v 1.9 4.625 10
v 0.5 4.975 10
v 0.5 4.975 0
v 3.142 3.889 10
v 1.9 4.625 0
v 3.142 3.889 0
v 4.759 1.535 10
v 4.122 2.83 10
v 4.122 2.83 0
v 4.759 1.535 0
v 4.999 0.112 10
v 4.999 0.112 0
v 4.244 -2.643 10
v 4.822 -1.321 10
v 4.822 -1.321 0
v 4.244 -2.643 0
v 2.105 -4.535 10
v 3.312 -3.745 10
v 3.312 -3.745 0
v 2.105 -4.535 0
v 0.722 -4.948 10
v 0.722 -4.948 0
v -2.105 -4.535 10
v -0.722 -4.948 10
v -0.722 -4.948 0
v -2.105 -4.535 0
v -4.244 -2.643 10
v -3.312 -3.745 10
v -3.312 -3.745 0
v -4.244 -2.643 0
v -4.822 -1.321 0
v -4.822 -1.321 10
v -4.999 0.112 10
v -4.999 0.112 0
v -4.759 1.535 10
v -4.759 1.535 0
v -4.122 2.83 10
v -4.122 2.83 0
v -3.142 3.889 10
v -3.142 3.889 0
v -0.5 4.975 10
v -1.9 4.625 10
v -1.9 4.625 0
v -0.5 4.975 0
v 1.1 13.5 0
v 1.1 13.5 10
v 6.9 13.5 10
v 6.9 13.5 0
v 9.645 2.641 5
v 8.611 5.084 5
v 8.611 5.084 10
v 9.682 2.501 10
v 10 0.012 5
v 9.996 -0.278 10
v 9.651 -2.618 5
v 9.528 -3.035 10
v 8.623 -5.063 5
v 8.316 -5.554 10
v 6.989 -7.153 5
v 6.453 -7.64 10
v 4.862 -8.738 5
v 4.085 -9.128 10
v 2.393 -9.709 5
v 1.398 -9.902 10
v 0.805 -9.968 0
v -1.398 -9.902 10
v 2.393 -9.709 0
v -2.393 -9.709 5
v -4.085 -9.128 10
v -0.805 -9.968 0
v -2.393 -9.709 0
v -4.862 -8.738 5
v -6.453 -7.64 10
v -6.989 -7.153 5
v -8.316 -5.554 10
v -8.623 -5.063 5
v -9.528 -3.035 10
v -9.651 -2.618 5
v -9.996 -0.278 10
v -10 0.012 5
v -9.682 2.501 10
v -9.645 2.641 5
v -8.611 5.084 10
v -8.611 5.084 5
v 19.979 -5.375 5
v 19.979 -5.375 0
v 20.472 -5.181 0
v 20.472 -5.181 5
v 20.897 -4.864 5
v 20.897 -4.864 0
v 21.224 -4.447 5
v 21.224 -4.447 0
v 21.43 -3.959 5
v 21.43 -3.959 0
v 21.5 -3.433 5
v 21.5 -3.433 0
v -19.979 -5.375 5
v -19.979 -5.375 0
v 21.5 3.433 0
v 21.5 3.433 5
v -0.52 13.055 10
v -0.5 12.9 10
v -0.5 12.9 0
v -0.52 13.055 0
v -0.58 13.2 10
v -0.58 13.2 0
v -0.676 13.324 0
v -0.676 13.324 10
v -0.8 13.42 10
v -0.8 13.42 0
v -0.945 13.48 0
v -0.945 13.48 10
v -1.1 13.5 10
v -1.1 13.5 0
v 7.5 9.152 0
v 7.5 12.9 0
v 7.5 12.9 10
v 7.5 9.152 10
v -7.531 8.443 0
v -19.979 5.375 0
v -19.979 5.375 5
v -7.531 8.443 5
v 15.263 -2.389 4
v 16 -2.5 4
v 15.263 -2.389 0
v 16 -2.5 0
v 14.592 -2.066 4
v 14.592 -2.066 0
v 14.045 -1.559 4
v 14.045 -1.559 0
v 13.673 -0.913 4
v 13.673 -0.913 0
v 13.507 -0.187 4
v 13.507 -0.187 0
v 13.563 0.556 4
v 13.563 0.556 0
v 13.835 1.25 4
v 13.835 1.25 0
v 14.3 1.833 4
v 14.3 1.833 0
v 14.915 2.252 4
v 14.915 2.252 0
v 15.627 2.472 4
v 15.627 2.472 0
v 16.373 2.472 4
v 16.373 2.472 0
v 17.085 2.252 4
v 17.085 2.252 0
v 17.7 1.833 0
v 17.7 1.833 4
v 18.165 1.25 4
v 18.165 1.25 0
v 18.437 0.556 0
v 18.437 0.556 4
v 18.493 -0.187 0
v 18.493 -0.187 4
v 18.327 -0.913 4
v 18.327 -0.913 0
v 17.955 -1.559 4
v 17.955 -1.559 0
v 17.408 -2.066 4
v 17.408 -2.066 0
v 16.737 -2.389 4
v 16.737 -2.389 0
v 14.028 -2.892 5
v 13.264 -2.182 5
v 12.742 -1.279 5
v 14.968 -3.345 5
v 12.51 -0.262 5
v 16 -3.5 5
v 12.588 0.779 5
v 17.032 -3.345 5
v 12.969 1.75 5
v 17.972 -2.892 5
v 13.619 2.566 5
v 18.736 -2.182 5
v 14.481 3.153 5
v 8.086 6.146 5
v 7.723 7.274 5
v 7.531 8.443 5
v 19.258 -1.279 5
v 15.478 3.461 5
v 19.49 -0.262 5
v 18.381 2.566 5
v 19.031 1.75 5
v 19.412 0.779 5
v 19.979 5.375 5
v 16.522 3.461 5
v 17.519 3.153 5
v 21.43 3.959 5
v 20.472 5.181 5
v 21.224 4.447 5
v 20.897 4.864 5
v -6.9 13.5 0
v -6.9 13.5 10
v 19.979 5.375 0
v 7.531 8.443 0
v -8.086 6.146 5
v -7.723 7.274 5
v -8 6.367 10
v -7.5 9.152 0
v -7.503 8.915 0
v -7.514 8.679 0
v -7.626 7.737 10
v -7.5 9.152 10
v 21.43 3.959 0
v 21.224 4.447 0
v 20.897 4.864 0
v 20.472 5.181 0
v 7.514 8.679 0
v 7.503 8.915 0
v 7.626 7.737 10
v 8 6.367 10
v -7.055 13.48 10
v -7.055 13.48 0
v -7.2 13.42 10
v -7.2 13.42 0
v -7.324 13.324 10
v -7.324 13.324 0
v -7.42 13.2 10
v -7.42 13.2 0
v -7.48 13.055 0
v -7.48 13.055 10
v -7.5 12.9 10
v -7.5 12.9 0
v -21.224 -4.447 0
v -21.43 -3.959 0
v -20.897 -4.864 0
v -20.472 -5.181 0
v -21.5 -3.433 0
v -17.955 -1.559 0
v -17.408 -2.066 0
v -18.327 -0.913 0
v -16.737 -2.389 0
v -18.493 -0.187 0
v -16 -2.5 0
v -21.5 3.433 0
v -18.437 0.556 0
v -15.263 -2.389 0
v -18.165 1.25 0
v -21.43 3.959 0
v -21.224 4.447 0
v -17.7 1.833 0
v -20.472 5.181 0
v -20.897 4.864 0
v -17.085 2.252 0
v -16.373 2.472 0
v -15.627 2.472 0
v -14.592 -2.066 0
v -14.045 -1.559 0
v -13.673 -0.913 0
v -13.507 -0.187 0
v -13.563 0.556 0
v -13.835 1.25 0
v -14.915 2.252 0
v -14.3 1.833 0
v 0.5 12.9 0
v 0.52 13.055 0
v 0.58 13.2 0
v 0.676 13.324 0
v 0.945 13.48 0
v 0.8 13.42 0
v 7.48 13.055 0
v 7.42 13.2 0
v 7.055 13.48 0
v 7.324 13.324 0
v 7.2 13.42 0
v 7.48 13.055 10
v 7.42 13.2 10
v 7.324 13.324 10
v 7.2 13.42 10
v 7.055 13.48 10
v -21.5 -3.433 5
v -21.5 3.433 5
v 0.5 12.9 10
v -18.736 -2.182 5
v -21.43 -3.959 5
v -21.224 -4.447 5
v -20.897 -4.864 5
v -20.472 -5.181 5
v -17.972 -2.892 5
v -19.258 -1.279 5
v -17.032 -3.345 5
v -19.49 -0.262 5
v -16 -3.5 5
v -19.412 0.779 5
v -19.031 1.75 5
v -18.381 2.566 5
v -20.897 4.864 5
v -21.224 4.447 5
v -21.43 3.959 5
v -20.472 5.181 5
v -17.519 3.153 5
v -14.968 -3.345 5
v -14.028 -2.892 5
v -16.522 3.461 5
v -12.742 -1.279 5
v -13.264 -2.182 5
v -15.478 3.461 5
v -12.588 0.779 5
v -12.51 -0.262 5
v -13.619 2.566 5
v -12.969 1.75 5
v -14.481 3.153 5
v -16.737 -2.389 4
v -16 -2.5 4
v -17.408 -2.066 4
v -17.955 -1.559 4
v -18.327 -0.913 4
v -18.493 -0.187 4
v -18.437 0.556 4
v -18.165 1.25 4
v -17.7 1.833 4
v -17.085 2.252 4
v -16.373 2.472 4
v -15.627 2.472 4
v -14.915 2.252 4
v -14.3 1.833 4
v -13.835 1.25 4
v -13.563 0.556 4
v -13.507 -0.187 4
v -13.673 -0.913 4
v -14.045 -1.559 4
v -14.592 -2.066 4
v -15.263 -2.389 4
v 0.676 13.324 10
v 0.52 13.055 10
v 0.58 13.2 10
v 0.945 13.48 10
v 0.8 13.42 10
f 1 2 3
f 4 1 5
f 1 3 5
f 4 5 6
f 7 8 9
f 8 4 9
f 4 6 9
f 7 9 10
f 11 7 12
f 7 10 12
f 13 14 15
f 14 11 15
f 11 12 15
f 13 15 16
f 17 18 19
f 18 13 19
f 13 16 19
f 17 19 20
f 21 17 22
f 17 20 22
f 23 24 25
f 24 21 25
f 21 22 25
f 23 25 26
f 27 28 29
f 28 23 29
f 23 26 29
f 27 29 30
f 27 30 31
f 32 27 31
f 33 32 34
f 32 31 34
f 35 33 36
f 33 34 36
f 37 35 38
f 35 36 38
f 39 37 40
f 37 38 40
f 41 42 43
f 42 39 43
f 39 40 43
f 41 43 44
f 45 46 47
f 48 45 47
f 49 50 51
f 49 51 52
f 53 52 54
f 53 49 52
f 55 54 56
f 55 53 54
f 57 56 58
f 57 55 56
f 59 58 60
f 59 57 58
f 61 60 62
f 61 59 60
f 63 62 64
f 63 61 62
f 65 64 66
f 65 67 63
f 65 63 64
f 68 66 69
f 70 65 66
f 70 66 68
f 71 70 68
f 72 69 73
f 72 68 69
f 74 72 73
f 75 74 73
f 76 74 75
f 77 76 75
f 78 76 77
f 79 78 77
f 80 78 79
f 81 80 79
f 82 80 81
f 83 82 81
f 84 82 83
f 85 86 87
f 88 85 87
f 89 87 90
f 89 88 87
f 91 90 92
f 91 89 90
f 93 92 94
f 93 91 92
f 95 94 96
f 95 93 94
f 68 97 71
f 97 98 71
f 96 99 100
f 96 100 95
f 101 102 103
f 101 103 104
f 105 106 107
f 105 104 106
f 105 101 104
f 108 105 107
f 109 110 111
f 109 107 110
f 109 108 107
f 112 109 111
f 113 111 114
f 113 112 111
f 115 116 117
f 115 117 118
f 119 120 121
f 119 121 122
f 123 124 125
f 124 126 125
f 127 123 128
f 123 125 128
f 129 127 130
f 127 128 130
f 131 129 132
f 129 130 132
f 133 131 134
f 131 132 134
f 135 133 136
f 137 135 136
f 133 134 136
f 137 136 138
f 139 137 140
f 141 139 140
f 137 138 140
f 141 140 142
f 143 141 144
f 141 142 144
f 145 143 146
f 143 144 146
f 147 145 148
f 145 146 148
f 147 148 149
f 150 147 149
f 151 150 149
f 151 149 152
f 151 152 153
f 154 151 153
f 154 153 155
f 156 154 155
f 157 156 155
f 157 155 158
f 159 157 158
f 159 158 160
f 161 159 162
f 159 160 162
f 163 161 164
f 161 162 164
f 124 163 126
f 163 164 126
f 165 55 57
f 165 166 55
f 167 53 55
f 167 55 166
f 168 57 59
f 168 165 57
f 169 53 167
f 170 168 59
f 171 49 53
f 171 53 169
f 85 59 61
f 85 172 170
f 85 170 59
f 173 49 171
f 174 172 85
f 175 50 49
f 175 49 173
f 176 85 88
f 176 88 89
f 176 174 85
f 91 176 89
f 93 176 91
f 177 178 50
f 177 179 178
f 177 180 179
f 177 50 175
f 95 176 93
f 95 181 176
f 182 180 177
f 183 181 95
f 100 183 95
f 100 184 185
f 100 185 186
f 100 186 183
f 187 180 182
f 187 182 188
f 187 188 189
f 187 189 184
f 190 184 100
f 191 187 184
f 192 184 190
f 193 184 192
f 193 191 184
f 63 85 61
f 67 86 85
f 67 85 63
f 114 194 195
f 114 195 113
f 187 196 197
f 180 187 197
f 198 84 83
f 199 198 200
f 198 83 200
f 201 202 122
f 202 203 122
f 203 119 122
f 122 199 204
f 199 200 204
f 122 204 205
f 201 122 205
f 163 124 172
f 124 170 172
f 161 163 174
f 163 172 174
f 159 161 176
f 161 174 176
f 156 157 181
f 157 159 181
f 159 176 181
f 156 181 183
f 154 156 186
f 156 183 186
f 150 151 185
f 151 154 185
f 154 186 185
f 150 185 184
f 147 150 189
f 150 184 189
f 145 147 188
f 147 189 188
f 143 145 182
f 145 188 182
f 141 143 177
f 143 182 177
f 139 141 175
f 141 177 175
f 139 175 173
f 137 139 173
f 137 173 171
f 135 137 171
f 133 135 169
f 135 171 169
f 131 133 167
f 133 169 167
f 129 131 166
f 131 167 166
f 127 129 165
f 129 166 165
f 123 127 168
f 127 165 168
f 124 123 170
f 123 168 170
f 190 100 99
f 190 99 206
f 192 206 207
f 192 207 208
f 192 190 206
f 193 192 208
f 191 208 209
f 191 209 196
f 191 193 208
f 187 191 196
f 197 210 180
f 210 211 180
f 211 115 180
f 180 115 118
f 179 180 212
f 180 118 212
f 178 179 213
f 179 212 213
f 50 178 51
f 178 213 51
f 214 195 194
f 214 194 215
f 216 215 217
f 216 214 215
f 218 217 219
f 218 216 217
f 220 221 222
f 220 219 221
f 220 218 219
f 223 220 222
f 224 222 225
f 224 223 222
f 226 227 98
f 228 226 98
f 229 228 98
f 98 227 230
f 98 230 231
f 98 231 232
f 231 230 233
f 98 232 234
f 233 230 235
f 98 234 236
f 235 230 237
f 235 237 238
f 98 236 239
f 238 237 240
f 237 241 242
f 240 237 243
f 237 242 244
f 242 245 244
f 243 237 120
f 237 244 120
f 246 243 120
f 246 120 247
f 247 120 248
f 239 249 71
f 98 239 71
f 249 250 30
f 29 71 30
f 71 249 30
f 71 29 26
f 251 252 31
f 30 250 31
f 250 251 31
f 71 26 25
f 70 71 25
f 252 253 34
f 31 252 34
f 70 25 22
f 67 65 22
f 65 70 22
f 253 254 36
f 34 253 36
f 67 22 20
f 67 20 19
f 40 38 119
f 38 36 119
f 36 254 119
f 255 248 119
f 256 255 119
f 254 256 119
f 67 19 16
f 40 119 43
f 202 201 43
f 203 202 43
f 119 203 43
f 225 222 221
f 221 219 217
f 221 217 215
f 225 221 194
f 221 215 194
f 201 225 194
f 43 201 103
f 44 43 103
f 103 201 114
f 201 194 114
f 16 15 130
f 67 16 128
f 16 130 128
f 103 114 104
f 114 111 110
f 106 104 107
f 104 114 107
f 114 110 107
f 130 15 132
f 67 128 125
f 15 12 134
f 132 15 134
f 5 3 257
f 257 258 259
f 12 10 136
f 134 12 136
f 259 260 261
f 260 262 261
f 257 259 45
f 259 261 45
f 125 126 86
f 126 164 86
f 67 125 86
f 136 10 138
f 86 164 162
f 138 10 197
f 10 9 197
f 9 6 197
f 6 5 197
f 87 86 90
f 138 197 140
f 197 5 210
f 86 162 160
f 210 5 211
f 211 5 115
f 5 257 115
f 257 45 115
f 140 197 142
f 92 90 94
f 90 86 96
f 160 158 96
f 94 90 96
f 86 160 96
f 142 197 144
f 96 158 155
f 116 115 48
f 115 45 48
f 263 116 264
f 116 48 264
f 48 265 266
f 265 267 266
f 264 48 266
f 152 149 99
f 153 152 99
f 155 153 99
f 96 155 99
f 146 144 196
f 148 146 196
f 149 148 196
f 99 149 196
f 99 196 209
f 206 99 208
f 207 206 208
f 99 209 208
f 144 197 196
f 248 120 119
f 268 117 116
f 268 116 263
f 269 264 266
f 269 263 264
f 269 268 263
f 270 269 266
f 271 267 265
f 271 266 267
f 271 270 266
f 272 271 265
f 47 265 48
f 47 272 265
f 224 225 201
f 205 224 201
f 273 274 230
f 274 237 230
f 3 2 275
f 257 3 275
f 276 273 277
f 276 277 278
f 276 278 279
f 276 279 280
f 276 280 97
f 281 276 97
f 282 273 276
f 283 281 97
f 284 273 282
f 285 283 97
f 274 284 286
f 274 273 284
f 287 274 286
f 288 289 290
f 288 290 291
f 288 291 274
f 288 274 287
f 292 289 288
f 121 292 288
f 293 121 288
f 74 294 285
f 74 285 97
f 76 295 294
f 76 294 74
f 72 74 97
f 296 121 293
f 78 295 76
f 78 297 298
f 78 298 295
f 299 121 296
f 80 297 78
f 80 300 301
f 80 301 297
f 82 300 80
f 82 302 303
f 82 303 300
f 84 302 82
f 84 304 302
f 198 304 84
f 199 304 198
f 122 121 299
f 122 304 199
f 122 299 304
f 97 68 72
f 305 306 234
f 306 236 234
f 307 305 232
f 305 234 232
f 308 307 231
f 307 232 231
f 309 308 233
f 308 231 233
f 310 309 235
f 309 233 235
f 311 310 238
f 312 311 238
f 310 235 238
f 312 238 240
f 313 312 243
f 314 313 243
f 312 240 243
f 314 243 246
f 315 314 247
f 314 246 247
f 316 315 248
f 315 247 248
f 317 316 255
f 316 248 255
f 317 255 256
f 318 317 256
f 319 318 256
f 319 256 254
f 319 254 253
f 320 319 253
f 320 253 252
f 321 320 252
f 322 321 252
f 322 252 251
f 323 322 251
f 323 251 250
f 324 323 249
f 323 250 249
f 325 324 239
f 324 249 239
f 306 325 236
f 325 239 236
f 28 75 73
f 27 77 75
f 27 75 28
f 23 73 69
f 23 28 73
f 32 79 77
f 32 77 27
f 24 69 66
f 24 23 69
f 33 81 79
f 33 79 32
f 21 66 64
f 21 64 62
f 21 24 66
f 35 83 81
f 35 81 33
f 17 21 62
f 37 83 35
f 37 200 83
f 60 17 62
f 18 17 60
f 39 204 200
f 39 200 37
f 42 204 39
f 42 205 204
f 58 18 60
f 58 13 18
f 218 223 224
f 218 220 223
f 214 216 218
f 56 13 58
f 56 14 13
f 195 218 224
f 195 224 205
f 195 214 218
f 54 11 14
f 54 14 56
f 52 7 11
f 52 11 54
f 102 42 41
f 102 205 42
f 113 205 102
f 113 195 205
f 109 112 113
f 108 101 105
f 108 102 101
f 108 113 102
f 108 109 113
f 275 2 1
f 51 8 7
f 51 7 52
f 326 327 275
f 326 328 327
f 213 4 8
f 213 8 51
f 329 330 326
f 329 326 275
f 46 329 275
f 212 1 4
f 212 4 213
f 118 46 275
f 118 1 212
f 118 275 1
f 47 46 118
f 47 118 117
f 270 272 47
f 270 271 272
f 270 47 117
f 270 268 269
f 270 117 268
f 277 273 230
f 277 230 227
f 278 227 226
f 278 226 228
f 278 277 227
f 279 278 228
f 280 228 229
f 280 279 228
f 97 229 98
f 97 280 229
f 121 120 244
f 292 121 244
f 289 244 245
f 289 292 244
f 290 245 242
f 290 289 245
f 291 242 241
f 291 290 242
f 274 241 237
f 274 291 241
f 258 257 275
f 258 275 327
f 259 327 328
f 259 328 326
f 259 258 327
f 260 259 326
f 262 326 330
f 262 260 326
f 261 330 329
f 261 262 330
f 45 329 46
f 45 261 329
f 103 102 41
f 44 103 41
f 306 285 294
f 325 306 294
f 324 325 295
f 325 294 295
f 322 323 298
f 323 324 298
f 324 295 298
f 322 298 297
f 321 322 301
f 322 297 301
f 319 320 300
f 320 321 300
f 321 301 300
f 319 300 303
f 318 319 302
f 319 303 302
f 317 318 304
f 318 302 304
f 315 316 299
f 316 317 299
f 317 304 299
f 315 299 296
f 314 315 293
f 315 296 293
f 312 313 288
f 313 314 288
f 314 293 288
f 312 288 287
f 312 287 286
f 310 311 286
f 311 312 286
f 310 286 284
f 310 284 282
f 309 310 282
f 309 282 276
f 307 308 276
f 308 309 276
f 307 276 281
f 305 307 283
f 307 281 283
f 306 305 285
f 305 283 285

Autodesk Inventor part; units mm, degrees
ref_plane "YZ Plane" through (0, 0, 0) normal (1, 0, 0) x (0, 1, 0)
ref_plane "XZ Plane" through (0, 0, 0) normal (0, 1, 0) x (-1, 0, 0)
ref_plane "XY Plane" through (0, 0, 0) normal (0, 0, 1) x (1, 0, 0)
sketch "Szkic1" plane through (0, 0, 0) normal (0, 0, 1) x (1, 0, 0)
  circle A0 centre (0, 0) radius 5
  line L0 (-21.5, 5) -> (-21.5, -5)
  line L1 (21.5, 5) -> (21.5, -5)
  circle A1 centre (0, 0) radius 10
  line L2 (-21.5, -5) -> (-2.3932, -9.7094)
  line L3 (21.5, -5) -> (2.3932, -9.7094)
  line L4 (-7.5, 13.5) -> (7.5, 13.5)
  line L5 (-21.5, 5) -> (-7.5, 8.4507)
  line L6 (21.5, 5) -> (7.5, 8.4507)
  line L7 (-7.5, 13.5) -> (-7.5, 6.6144)
  line L8 (7.5, 13.5) -> (7.5, 6.6144)
  dimension "d0" = 10
  dimension "d1" = 43
  dimension "d2" = 10
  dimension "d3" = 10
  dimension "d4" = 5
  dimension "d5" = 21.5
  dimension "d6" = 20
  dimension "d7" = 13.5
  dimension "d8" = 7.5
  dimension "d9" = 15
extrude "Wyciągnięcie proste1" add sketch "Szkic1" along normal blind 5 contours L5 L7 A1 L2 L0 | A1 L8 L6 L1 L3
extrude "Wyciągnięcie proste2" add sketch "Szkic1" along normal blind 10 contours L7 L4 L8 A1 | A1
fillet "Zaokrąglenie1" radius 8 2 edges at (7.5, 6.6144, 7.5) (-7.5, 6.6144, 7.5)
fillet "Zaokrąglenie2" radius 2 4 edges at (21.5, 5, 2.5) (21.5, -5, 2.5) (-21.5, -5, 2.5) (-21.5, 5, 2.5)
sketch "Szkic2" plane through (0, 0, 10) normal (0, 0, 1) x (1, 0, 0)
  line L0 (-0.5, 2.515) -> (0.5, 2.515)
  line L1 (0.5, 2.515) -> (0.5, 16.0792)
  line L2 (0.5, 16.0792) -> (-0.5, 16.0792)
  line L3 (-0.5, 16.0792) -> (-0.5, 2.515)
  point P0 (0, 0)
  dimension "d16" = 1
  dimension "d17" = 0.5
extrude "Wyciągnięcie proste3" cut sketch "Szkic2" against normal through all
fillet "Zaokrąglenie3" radius 0.6 4 edges at (-7.5, 13.5, 5) (-0.5, 13.5, 5) (0.5, 13.5, 5) (7.5, 13.5, 5)
sketch "Szkic3" plane through (0, 0, 5) normal (0, 0, 1) x (1, 0, 0)
  arc A0 (-19.9786, 5.375) -> (-21.5, 3.4331) centre (-19.5, 3.4331) ccw projected
  line L0 (-21.5, 3.4331) -> (-21.5, -3.4331) projected
  arc A1 (-21.5, -3.4331) -> (-19.9786, -5.375) centre (-19.5, -3.4331) ccw projected
  line L1 (-19.9786, -5.375) -> (-2.3932, -9.7094) projected
  arc A2 (-8.6111, 5.0842) -> (-2.3932, -9.7094) centre (0, 0) ccw projected
  arc A3 (-8.6111, 5.0842) -> (-7.5314, 8.4429) centre (-15.5, 9.1515) ccw projected
  line L2 (-7.5314, 8.4429) -> (-19.9786, 5.375) projected
  arc A4 (19.9786, -5.375) -> (21.5, -3.4331) centre (19.5, -3.4331) ccw projected
  line L3 (21.5, -3.4331) -> (21.5, 3.4331) projected
  arc A5 (21.5, 3.4331) -> (19.9786, 5.375) centre (19.5, 3.4331) ccw projected
  line L4 (19.9786, 5.375) -> (7.5314, 8.4429) projected
  arc A6 (7.5314, 8.4429) -> (8.6111, 5.0842) centre (15.5, 9.1515) ccw projected
  arc A7 (2.3932, -9.7094) -> (8.6111, 5.0842) centre (0, 0) ccw projected
  line L5 (2.3932, -9.7094) -> (19.9786, -5.375) projected
  point P0 (-16, 0)
  point P1 (16, 0)
  dimension "d21" = 32
  dimension "d22" = 43
  dimension "d23" = 5.5
hole "Otwór1" at (-16, 0, 5) at (16, 0, 5) direction (0, 0, -1) diameter 5 end through all
chamfer "Faza1" distance 1 angle 45 2 edges at (-16, 2.5, 5) (16, 2.5, 5)
equation "\"d3\" = d2"
equation "\"d5\" = 0.5 * d1"
equation "\"d8\" = 0.5 * d9"
equation "\"d23\" = -0.5 * d21 + 0.5 * d22"
properties part number "COTS_GENERIC_SHF10_Linear_Rail_Mount"
